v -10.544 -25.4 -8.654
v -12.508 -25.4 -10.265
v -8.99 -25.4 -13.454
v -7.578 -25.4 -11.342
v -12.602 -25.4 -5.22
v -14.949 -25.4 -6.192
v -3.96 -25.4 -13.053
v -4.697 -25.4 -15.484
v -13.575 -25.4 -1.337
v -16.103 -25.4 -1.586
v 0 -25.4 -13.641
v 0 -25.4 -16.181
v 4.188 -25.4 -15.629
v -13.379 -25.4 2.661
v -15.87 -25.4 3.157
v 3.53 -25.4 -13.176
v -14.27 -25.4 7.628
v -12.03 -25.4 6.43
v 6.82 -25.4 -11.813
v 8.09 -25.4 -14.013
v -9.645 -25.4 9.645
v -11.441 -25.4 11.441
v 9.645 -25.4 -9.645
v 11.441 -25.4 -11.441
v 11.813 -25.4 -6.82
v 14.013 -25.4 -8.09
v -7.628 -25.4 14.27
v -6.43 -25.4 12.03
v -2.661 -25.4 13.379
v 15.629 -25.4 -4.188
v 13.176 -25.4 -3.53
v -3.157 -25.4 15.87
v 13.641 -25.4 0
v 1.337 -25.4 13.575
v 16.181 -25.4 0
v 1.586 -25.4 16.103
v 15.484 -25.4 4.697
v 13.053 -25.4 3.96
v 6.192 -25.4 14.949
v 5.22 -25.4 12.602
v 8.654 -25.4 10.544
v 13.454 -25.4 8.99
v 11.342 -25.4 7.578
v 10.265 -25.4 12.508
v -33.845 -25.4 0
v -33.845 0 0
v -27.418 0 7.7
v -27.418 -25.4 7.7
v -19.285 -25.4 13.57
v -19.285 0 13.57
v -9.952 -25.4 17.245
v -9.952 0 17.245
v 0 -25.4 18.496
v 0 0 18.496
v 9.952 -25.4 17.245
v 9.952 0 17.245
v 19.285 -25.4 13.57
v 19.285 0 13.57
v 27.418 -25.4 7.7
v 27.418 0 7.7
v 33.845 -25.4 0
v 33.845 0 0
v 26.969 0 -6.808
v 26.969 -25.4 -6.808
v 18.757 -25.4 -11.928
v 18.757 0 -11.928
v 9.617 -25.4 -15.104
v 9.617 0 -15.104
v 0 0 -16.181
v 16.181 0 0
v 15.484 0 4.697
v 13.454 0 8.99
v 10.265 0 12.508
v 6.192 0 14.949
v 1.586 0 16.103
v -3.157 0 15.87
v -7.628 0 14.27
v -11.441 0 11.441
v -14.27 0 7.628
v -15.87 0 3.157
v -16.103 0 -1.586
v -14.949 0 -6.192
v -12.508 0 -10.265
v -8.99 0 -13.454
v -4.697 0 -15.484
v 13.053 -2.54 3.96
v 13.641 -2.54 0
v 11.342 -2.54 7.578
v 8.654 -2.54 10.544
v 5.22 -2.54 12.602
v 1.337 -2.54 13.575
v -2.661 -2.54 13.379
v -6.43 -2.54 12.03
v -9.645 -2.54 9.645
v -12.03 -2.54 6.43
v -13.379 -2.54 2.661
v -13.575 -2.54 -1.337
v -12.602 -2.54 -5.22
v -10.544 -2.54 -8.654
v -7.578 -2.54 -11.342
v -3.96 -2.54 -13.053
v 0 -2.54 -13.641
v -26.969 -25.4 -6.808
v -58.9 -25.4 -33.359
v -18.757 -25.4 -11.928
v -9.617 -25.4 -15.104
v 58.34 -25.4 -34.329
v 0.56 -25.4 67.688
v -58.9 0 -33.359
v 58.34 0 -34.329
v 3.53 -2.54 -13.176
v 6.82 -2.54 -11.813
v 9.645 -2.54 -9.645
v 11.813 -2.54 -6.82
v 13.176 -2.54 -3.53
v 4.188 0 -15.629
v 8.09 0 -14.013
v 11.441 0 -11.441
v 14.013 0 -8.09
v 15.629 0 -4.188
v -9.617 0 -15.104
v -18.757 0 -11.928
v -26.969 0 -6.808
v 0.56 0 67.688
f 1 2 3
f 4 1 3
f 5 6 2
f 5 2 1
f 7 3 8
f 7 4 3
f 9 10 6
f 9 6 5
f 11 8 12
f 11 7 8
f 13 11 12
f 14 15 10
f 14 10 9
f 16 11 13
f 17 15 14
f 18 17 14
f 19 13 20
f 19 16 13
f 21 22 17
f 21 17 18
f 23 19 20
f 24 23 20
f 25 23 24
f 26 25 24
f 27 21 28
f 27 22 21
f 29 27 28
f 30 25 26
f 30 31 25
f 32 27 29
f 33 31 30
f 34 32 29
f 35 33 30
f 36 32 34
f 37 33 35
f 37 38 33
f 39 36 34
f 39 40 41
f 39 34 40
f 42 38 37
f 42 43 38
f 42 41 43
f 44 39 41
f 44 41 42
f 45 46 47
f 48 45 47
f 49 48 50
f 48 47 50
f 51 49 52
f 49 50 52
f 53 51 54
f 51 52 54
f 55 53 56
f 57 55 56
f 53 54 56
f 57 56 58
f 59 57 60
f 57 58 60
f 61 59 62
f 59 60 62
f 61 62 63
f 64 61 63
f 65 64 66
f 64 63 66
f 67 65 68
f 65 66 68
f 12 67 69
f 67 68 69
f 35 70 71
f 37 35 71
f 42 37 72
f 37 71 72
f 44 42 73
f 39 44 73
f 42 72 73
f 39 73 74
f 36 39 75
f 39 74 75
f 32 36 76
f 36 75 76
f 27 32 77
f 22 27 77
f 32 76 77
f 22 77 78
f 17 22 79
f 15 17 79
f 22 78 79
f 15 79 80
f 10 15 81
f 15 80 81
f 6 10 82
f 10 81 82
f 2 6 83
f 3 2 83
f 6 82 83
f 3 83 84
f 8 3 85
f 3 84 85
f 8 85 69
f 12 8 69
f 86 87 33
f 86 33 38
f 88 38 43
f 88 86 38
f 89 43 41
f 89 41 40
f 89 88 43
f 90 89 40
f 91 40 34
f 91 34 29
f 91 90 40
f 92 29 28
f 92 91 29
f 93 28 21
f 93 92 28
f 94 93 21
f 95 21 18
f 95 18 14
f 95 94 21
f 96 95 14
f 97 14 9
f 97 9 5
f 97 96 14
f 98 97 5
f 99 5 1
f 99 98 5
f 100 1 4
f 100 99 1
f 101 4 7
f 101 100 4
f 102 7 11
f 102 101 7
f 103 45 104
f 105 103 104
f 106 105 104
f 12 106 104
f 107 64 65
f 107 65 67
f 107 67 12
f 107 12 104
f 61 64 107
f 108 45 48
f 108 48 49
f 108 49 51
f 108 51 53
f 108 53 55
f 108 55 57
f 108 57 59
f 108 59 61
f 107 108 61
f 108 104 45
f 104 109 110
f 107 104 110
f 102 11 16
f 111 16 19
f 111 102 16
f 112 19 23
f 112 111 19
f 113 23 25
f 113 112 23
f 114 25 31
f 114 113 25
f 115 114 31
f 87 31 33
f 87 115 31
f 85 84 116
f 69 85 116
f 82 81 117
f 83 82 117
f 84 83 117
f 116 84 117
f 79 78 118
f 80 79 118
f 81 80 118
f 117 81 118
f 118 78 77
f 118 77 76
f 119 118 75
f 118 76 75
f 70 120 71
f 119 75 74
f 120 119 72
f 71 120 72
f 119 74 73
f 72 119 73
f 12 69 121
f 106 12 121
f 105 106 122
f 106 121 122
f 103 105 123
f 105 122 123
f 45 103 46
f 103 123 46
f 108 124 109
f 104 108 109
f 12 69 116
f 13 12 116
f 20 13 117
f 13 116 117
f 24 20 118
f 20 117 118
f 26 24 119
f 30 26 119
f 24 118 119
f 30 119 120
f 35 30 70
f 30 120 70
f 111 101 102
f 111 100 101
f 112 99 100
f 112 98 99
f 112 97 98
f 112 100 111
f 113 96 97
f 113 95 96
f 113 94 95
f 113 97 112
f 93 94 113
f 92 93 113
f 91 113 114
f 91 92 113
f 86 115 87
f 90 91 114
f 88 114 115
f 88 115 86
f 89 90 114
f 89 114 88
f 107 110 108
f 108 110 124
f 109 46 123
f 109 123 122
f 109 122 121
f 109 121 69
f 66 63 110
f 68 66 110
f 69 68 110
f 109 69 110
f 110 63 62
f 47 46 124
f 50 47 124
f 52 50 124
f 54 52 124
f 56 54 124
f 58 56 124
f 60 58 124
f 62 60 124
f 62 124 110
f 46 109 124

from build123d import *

# Parameters (mm, degrees)
F1_DEPTH = 25.4
F2_T     = -2.54


with BuildPart() as f1:
    # F0 (on Front) → F1 (new body)
    with BuildSketch(Plane.XZ):
        Polygon((58.3398665776, -34.3291762416), (0.5600054274, 67.6883946304), (-58.899872005, -33.3592183888), align=None)
        with BuildLine():
            ThreePointArc((-33.8453555666, 0), (0, 18.4960578721), (33.8453555666, 0))
            ThreePointArc((33.8453555666, 0), (18.7571482754, -11.9275272018), (3.28e-08, -16.1806782942))
            ThreePointArc((3.28e-08, -16.1806782942), (-18.7571482459, -11.927527216), (-33.8453555666, 0))
        make_face(mode=Mode.SUBTRACT)
    extrude(amount=F1_DEPTH)


with BuildPart() as f1b:
    # F0 (on Front) → F1, piece 2 (new body)
    with BuildSketch(Plane.XZ):
        with BuildLine():
            ThreePointArc((16.1806782942, 0), (-11.4414673576, 11.4414673344), (3.28e-08, -16.1806782942))
            ThreePointArc((3.28e-08, -16.1806782942), (11.4414673576, -11.4414673344), (16.1806782942, 0))
        make_face()
    extrude(amount=F1_DEPTH)

    # F2
    f2_openings = [f1b.faces().sort_by_distance(p)[0] for p in [
        (0, -25.4, 0),
    ]]
    offset(amount=F2_T, openings=f2_openings)


solid = Compound([f1.part, f1b.part])
